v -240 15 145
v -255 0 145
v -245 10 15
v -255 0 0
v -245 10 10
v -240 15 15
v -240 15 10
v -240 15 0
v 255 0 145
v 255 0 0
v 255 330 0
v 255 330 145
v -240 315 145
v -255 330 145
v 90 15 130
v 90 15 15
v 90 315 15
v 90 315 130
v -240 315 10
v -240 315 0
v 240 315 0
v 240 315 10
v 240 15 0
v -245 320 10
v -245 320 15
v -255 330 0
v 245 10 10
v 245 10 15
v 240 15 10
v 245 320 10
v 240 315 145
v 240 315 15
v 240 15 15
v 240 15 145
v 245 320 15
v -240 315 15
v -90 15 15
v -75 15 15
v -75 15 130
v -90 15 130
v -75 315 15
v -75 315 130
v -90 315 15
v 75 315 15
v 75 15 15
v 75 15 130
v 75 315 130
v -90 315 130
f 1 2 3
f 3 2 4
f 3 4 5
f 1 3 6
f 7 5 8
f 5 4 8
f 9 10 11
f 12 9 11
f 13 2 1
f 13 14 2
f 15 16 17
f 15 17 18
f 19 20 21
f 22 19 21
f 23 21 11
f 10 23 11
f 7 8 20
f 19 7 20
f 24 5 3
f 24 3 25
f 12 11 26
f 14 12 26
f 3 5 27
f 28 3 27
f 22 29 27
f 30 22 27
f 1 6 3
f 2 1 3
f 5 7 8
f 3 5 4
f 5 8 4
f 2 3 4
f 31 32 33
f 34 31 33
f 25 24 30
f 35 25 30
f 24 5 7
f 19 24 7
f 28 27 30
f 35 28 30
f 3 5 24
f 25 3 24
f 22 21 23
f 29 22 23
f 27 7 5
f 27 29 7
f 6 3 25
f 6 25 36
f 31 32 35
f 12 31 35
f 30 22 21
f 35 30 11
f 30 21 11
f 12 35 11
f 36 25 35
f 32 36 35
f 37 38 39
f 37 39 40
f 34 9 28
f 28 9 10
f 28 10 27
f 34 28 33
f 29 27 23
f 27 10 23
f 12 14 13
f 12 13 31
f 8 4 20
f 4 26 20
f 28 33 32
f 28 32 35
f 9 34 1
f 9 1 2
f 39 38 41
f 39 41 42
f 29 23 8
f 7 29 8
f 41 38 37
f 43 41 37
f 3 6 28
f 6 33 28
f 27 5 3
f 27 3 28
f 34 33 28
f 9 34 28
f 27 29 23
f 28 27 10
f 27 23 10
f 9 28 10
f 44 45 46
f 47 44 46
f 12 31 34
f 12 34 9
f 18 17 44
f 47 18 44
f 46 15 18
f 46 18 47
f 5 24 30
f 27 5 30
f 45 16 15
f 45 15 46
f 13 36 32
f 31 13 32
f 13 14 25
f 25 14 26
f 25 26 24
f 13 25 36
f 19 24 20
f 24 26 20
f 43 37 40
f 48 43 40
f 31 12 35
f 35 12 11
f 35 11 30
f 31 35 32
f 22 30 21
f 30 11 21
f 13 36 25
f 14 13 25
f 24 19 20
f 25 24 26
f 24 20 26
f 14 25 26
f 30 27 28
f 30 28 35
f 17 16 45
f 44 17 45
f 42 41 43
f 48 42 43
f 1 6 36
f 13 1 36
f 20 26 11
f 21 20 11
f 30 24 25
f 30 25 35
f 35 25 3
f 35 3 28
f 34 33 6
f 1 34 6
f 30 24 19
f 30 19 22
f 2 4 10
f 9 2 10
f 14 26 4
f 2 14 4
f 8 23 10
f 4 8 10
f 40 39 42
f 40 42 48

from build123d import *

# Parameters (mm, degrees)
F3_W      = 490
F3_H      = 310
F4_DEPTH  = 5
F6_DEPTH  = 145
F7_DEPTH  = 145
F10_W     = 15
F10_H     = 115
F11_DEPTH = 300


with BuildPart() as f4:
    # F3 (on plane+point) → F4 (new body, through all)
    with BuildSketch(Plane.XY.offset(10)):
        with Locations((0, 165)):
            Rectangle(F3_W, F3_H)
    extrude(amount=F4_DEPTH)


with BuildPart() as f6:
    # F5 (on Top) → F6 (new body, through all)
    with BuildSketch(Plane.XY):
        Polygon((240, 15), (-240, 15), (-255, 0), (255, 0), align=None)
    extrude(amount=F6_DEPTH)

    # F8: cut F4
    add(f4.part, mode=Mode.SUBTRACT)


with BuildPart() as f6b:
    # F5 (on Top) → F6, piece 2 (new body, through all)
    with BuildSketch(Plane.XY):
        Polygon((-255, 330), (-240, 315), (240, 315), (255, 330), align=None)
    extrude(amount=F6_DEPTH)

    # F8: cut F4
    add(f4.part, mode=Mode.SUBTRACT)


with BuildPart() as f7:
    # F5 (on Top) → F7 (new body, through all)
    with BuildSketch(Plane.XY):
        Polygon((-255, 0), (-240, 15), (-240, 315), (-255, 330), align=None)
    extrude(amount=F7_DEPTH)

    # F9: cut F4
    add(f4.part, mode=Mode.SUBTRACT)


with BuildPart() as f7b:
    # F5 (on Top) → F7, piece 2 (new body, through all)
    with BuildSketch(Plane.XY):
        Polygon((240, 315), (240, 15), (255, 0), (255, 330), align=None)
    extrude(amount=F7_DEPTH)

    # F9: cut F4
    add(f4.part, mode=Mode.SUBTRACT)


with BuildPart() as f11:
    # F10 (on face) → F11 (new body, through all)
    with BuildSketch(Plane(origin=(0, 15, 0), x_dir=(-1, 0, 0), z_dir=(0, 1, 0))):
        with Locations((-82.5, 72.5)):
            Rectangle(F10_W, F10_H)
    extrude(amount=F11_DEPTH)


with BuildPart() as f11b:
    # F10 (on face) → F11, piece 2 (new body, through all)
    with BuildSketch(Plane(origin=(0, 15, 0), x_dir=(-1, 0, 0), z_dir=(0, 1, 0))):
        with Locations((82.5, 72.5)):
            Rectangle(F10_W, F10_H)
    extrude(amount=F11_DEPTH)


solid = Compound([f4.part, f6.part, f6b.part, f7.part, f7b.part, f11.part, f11b.part])
